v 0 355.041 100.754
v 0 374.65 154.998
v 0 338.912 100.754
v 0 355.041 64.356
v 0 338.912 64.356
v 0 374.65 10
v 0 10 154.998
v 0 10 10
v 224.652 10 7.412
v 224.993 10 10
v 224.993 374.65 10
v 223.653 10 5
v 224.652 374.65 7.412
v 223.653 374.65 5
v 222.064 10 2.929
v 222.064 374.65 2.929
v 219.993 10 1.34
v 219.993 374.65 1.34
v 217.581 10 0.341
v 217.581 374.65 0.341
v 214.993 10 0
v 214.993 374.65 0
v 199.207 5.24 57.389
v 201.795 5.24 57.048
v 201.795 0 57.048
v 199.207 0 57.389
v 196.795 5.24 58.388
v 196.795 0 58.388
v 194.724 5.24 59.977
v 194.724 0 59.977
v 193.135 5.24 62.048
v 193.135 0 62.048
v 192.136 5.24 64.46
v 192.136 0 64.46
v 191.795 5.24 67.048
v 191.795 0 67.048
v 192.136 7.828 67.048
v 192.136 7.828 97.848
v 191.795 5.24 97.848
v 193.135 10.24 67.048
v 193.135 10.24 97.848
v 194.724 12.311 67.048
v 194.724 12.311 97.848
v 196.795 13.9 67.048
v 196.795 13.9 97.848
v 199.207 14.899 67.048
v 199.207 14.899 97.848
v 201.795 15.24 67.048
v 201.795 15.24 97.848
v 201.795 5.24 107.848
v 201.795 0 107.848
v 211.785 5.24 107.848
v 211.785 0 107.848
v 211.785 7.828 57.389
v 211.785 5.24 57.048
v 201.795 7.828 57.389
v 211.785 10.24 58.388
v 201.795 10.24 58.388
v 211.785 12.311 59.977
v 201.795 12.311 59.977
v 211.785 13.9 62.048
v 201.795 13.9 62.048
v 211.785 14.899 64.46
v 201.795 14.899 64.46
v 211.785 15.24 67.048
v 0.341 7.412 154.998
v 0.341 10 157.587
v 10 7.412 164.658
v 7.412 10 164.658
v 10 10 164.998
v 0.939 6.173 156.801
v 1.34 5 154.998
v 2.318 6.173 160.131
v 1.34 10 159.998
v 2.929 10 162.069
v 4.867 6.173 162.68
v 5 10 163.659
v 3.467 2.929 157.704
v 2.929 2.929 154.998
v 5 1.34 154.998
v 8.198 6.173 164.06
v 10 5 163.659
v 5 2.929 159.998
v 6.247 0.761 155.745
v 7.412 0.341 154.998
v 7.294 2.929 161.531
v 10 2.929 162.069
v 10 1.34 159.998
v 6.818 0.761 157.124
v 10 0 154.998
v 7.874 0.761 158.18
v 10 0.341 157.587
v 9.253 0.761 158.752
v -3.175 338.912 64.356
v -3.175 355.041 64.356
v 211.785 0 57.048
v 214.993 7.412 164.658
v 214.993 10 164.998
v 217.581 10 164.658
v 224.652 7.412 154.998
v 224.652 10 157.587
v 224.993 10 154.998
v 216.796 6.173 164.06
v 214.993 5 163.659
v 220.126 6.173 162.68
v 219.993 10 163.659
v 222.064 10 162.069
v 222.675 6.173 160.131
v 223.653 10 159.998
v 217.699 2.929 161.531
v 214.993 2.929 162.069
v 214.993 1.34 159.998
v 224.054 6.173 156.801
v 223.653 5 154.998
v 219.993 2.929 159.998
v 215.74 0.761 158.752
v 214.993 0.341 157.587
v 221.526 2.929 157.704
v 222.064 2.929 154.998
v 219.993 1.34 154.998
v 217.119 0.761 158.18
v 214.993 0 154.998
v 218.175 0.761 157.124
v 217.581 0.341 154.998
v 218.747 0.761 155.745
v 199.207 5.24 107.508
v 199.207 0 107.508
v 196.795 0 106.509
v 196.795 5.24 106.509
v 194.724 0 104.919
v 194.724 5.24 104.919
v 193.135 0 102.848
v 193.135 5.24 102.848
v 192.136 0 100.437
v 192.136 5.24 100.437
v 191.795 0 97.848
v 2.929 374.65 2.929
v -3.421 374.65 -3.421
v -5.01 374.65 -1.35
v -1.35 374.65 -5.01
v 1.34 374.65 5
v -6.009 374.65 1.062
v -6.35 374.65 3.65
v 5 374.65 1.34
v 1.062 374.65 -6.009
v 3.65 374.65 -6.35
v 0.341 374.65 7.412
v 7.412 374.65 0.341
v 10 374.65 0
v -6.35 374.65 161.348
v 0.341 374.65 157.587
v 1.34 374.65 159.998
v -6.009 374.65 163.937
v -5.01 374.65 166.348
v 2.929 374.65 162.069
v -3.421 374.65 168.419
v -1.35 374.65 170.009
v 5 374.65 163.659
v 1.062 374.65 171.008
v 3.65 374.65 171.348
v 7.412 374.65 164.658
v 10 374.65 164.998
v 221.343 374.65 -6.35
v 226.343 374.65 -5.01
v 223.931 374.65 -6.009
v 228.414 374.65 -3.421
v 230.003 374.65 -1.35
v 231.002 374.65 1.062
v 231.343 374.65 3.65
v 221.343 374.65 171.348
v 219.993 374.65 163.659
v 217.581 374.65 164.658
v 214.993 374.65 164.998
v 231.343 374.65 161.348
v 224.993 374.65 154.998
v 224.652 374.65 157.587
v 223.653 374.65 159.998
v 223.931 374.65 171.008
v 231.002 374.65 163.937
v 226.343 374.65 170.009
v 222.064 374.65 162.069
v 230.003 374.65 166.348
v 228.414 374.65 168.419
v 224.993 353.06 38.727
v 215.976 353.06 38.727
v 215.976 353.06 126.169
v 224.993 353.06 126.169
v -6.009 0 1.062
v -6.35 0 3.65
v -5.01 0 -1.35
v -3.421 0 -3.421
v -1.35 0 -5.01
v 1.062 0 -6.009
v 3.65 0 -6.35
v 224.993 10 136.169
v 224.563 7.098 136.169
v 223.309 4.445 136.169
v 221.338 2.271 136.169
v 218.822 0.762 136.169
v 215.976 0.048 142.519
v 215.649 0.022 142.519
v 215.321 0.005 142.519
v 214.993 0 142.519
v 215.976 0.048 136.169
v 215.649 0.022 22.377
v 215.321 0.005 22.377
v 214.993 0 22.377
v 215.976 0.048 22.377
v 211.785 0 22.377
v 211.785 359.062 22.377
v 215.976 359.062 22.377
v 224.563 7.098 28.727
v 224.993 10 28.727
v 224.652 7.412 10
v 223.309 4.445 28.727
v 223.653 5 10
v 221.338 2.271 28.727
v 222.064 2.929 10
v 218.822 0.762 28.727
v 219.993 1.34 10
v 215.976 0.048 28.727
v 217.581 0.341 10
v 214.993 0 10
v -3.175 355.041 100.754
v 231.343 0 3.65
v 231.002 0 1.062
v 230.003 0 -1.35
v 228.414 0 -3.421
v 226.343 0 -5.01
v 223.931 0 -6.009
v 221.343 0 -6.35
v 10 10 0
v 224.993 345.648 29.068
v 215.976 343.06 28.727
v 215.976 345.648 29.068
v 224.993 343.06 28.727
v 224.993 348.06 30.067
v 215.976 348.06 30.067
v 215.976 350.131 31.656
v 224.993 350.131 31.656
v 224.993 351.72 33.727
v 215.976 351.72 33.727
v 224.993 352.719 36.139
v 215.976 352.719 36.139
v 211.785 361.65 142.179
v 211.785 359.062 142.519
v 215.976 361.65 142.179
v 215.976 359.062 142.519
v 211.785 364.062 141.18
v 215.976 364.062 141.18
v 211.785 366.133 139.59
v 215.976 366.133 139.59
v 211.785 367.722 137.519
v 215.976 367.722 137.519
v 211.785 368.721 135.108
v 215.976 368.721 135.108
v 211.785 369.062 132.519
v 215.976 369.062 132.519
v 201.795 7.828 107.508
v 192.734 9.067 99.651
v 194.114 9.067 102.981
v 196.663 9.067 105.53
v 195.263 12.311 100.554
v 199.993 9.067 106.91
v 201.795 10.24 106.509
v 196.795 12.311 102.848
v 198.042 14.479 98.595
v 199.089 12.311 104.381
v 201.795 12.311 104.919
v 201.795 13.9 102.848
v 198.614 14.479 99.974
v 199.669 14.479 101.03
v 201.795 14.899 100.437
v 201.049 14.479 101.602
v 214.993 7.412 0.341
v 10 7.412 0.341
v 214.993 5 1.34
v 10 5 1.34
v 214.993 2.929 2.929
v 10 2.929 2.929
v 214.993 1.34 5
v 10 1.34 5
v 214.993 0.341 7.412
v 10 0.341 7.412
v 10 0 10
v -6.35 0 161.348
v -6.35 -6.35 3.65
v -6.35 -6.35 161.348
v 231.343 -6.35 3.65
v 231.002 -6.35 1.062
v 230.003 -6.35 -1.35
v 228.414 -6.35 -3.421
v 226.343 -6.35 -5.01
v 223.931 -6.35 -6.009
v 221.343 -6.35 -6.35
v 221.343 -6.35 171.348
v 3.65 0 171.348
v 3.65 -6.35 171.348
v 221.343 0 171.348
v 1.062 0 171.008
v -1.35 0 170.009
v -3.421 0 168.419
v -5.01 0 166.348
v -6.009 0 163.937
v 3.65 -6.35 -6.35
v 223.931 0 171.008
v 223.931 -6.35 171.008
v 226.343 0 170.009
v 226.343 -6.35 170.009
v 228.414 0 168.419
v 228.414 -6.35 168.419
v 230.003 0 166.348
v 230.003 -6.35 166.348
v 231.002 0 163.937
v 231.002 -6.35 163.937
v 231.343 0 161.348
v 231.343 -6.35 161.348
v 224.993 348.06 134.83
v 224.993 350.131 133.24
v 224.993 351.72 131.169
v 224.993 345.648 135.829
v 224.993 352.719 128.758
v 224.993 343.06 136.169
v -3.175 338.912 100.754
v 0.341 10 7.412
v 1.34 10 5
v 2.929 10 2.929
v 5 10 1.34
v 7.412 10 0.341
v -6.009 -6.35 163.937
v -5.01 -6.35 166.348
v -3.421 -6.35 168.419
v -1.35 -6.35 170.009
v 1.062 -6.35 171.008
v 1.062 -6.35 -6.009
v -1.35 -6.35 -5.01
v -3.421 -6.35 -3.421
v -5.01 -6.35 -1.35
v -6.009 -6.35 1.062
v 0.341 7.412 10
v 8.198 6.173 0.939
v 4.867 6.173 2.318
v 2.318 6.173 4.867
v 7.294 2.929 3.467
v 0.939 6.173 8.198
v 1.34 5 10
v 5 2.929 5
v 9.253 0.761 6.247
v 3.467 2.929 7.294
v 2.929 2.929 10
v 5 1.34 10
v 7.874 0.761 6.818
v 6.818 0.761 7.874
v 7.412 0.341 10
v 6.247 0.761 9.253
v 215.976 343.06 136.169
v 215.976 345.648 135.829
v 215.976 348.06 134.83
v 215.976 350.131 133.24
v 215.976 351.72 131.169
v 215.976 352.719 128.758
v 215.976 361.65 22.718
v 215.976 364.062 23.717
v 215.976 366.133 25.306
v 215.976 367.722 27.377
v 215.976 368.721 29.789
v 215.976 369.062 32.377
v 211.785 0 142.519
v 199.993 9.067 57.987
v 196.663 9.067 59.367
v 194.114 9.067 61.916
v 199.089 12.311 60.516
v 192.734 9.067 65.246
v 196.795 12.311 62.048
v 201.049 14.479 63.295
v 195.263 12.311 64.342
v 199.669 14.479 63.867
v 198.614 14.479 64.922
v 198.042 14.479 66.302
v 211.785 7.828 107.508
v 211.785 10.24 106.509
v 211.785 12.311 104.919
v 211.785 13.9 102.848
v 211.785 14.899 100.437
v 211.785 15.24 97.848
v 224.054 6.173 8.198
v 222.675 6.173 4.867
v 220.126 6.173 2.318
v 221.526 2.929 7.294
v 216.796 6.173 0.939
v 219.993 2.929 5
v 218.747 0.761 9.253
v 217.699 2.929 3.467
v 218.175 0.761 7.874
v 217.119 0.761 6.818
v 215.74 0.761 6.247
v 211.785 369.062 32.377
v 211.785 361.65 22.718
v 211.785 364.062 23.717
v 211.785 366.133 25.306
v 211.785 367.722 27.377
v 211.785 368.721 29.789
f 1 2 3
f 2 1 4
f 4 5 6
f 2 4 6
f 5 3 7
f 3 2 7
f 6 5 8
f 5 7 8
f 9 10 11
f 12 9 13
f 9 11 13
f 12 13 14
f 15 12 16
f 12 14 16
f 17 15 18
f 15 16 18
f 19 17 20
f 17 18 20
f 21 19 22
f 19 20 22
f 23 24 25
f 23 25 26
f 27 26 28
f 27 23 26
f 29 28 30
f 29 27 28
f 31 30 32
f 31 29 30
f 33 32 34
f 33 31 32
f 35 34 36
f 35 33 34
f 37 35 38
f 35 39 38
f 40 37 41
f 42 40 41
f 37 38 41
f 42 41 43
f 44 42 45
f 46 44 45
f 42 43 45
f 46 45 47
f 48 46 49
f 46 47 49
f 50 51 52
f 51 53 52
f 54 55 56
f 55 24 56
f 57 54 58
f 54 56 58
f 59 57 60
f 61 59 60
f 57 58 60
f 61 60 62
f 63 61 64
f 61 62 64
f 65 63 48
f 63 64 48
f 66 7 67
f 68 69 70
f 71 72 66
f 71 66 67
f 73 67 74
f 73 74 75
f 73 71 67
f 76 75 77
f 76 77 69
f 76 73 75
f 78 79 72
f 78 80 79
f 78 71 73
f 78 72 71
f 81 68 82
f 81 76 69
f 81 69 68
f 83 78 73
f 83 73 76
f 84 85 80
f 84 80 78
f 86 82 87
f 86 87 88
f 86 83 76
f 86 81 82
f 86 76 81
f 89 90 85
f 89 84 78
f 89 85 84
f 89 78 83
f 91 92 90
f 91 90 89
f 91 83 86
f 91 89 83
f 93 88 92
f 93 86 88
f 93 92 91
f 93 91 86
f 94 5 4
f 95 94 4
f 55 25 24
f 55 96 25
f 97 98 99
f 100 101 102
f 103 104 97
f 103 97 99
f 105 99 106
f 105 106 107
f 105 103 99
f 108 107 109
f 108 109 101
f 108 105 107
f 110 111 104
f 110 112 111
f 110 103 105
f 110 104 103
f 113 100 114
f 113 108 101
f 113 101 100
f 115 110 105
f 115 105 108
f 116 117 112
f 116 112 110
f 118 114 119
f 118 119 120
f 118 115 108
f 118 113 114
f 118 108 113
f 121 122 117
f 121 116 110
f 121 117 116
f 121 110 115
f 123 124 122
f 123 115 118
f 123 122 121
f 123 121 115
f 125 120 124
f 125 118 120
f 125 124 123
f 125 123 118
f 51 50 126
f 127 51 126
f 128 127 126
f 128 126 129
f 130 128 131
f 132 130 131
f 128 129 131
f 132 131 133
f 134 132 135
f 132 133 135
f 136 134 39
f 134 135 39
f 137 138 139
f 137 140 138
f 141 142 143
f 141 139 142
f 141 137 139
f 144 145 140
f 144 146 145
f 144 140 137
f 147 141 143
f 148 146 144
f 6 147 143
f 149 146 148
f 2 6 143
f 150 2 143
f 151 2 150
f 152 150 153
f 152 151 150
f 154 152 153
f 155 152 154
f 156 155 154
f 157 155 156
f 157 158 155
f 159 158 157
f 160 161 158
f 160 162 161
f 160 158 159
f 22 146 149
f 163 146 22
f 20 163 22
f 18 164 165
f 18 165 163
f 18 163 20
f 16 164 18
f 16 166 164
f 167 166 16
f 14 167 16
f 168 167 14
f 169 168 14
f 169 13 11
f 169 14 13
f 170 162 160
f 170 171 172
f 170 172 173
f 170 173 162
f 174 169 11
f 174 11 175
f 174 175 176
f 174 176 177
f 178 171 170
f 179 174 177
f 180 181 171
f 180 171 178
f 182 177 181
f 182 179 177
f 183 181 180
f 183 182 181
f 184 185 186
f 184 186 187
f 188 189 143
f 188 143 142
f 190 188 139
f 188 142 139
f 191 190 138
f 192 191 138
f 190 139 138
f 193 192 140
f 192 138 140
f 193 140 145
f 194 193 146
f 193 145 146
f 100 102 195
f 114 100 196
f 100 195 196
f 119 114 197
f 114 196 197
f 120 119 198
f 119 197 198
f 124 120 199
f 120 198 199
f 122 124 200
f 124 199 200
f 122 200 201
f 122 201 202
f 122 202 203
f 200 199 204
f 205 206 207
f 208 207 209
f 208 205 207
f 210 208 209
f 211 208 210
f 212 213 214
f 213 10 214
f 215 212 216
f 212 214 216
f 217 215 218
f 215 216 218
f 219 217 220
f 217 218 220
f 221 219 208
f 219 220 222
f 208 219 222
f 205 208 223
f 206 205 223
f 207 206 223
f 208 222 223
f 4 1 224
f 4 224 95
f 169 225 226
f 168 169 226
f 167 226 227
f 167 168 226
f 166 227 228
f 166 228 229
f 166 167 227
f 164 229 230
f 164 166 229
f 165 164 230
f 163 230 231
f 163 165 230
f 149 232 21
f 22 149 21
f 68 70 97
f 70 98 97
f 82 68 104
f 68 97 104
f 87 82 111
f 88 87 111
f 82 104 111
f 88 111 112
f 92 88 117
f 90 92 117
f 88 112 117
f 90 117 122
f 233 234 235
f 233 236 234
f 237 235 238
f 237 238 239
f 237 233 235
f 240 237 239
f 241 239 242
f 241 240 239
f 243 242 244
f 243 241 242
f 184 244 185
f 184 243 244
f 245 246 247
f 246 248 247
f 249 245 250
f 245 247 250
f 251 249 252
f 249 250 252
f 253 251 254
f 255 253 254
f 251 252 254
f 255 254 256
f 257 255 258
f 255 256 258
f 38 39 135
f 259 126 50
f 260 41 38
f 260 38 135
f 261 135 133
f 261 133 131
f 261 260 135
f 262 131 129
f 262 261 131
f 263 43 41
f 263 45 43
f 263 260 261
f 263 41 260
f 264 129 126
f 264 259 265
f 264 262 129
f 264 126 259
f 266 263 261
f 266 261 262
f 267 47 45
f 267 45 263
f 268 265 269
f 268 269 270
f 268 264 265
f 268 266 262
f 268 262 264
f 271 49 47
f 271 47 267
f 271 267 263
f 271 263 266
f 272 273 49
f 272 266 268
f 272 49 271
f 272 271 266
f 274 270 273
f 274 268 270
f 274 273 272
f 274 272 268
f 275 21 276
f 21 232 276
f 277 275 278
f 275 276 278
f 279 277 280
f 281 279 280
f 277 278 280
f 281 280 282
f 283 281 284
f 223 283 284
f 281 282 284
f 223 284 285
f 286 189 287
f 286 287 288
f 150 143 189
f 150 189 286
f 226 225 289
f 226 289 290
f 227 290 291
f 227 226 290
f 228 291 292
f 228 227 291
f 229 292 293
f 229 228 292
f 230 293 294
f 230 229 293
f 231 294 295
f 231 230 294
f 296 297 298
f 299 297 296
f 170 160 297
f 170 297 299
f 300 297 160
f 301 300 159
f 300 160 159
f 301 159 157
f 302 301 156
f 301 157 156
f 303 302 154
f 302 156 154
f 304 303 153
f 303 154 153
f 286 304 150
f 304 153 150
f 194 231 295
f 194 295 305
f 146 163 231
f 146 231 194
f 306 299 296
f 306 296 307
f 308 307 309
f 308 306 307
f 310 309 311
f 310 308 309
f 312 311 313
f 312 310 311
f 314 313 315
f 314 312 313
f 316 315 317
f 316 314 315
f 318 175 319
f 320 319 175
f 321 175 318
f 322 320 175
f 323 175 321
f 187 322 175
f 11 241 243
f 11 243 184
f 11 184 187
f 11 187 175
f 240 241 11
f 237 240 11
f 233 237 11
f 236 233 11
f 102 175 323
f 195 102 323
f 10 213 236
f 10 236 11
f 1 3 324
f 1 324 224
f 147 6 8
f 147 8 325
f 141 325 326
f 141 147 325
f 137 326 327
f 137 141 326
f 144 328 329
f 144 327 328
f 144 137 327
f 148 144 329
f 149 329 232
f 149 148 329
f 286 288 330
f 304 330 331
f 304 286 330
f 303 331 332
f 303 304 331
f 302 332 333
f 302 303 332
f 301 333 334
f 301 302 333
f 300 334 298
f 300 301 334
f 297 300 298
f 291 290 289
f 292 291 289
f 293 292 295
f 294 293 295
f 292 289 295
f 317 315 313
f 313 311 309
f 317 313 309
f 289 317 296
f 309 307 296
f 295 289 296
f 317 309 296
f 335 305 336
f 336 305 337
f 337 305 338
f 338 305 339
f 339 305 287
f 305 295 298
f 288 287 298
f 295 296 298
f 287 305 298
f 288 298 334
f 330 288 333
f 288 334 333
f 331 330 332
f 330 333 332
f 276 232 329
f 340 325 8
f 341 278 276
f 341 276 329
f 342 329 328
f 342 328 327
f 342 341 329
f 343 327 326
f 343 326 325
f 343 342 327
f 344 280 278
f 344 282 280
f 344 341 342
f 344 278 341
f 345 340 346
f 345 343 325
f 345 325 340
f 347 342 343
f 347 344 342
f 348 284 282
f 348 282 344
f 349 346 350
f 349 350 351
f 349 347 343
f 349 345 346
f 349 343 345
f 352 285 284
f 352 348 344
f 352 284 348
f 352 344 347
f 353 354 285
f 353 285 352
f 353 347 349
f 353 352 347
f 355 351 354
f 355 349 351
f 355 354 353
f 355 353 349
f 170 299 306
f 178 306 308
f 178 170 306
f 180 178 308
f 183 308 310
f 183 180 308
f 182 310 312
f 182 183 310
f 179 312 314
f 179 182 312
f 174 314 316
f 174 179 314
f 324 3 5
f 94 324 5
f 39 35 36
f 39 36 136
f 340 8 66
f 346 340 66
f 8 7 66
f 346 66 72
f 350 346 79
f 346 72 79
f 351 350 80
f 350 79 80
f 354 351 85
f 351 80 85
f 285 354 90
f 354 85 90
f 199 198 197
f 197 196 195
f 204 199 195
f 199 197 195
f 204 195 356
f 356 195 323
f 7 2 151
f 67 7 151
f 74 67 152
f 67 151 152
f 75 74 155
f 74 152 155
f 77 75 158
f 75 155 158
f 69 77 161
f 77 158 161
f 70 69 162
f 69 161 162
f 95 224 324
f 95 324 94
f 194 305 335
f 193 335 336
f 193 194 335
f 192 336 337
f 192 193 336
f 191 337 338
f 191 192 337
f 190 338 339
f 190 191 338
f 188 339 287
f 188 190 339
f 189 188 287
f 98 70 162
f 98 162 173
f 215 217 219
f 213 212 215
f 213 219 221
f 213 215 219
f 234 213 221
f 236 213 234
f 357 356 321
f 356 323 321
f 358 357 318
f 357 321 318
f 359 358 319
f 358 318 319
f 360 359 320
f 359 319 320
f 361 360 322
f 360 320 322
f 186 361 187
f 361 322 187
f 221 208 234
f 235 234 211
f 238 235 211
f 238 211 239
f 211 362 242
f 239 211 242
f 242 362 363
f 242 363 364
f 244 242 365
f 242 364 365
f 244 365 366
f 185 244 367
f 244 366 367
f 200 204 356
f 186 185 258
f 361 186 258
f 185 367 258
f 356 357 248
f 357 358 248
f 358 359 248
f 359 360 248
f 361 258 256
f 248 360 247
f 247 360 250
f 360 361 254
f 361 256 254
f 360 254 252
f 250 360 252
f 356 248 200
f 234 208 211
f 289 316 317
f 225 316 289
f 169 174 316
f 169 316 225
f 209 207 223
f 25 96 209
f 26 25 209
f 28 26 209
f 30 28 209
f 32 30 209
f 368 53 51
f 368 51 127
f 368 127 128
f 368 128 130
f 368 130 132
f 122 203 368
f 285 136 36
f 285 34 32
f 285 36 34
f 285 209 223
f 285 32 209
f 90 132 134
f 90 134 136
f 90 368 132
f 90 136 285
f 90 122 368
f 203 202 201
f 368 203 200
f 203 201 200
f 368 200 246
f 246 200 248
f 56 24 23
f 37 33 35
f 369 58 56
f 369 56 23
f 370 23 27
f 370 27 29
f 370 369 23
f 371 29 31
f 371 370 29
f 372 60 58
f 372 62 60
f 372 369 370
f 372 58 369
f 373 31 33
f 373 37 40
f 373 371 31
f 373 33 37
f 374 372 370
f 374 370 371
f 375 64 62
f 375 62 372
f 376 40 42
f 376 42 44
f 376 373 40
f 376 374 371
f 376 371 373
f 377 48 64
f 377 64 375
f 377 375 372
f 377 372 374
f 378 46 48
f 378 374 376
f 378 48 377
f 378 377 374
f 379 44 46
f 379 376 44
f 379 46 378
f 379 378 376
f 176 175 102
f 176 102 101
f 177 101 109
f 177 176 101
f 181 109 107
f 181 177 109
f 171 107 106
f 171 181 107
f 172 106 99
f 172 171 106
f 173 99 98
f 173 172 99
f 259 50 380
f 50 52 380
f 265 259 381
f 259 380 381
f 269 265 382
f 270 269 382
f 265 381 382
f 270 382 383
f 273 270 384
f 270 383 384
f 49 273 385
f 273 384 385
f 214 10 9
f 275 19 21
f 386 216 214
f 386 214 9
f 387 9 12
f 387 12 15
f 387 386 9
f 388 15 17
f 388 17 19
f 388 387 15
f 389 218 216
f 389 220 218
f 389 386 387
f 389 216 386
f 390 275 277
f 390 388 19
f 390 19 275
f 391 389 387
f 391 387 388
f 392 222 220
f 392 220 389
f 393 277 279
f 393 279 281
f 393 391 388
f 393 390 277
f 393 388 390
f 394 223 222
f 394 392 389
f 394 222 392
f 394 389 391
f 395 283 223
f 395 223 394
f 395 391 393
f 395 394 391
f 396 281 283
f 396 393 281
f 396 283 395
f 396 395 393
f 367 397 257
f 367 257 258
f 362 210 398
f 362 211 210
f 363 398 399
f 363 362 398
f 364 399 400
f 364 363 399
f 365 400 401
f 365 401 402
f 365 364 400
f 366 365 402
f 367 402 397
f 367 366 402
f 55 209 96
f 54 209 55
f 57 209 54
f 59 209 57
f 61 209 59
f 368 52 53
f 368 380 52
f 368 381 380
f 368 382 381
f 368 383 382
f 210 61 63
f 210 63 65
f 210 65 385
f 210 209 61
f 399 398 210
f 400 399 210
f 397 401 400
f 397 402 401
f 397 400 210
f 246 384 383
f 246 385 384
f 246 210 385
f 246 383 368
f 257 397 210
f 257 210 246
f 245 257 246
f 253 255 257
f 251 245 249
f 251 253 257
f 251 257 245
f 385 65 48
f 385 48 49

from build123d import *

# Parameters (mm, degrees)
SKETCH1_W           = 237.6932
SKETCH1_H           = 177.6984
SKETCH1_W_2         = 224.9932
SKETCH1_H_2         = 164.9984
BOSS_EXTRUDE1_DEPTH = 374.65
SKETCH4_W           = 107.442
SKETCH4_H           = 374.65
BOSS_EXTRUDE2_DEPTH = 9.017
SKETCH5_W           = 120.142
SKETCH5_H           = 374.65
BOSS_EXTRUDE3_DEPTH = 4.191
SKETCH7_W           = 9.017
SKETCH7_H           = 107.442
CUT_EXTRUDE1_DEPTH  = 21.59
SKETCH10_W          = 4.191
SKETCH10_H          = 120.142
CUT_EXTRUDE2_DEPTH  = 5.588
FILLET1_R           = 10
FILLET2_R           = 10
FILLET3_R           = 10
FILLET4_R           = 10
FILLET5_R           = 10
FILLET6_R           = 10
FILLET7_R           = 10
SKETCH11_W          = 50.8
SKETCH11_H          = 15.24
BOSS_EXTRUDE4_DEPTH = 19.9898
FILLET10_R          = 10
FILLET11_R          = 10
BOSS_EXTRUDE5_DEPTH = 6.35
FILLET13_R          = 10
SKETCH13_W          = 36.3982
SKETCH13_H          = 16.129
CUT_EXTRUDE4_DEPTH  = 3.175


with BuildPart() as part:
    # Sketch1 → Boss-Extrude1 (new body)
    with BuildSketch(Plane(origin=(0, 0, 0), x_dir=(1, 0, 0), z_dir=(0, 1, 0))):
        with Locations((112.4966, -82.4992)):
            Rectangle(SKETCH1_W, SKETCH1_H)
        with Locations((112.4966, -82.4992)):
            Rectangle(SKETCH1_W_2, SKETCH1_H_2, mode=Mode.SUBTRACT)
    extrude(amount=BOSS_EXTRUDE1_DEPTH)

    # Sketch4 → Boss-Extrude2 (add)
    with BuildSketch(Plane.ZY.offset(-224.9932)):
        with Locations((82.4484, 187.325)):
            Rectangle(SKETCH4_W, SKETCH4_H)
    extrude(amount=BOSS_EXTRUDE2_DEPTH)

    # Sketch5 → Boss-Extrude3 (add)
    with BuildSketch(Plane.ZY.offset(-215.9762)):
        with Locations((82.4484, 187.325)):
            Rectangle(SKETCH5_W, SKETCH5_H)
    extrude(amount=BOSS_EXTRUDE3_DEPTH)

    # Sketch7 → Cut-Extrude1 (cut)
    with BuildSketch(Plane(origin=(0, 374.65, 0), x_dir=(1, 0, 0), z_dir=(0, 1, 0))):
        with Locations((220.4847, -82.4484)):
            Rectangle(SKETCH7_W, SKETCH7_H)
    extrude(amount=-CUT_EXTRUDE1_DEPTH, mode=Mode.SUBTRACT)

    # Sketch10 → Cut-Extrude2 (cut)
    with BuildSketch(Plane(origin=(0, 374.65, 0), x_dir=(1, 0, 0), z_dir=(0, 1, 0))):
        with Locations((213.8807, -82.4484)):
            Rectangle(SKETCH10_W, SKETCH10_H)
    extrude(amount=-CUT_EXTRUDE2_DEPTH, mode=Mode.SUBTRACT)

    # Fillet1
    fillet1_edges = [part.edges().sort_by_distance(p)[0] for p in [
        (231.3432, 187.325, 171.3484),
    ]]
    fillet(fillet1_edges, radius=FILLET1_R)

    # Fillet2
    fillet2_edges = [part.edges().sort_by_distance(p)[0] for p in [
        (224.9932, 187.325, 164.9984),
    ]]
    fillet(fillet2_edges, radius=FILLET2_R)

    # Fillet3
    fillet3_edges = [part.edges().sort_by_distance(p)[0] for p in [
        (224.9932, 187.325, 0),
        (231.3432, 187.325, -6.35),
    ]]
    fillet(fillet3_edges, radius=FILLET3_R)

    # Fillet4
    fillet4_edges = [part.edges().sort_by_distance(p)[0] for p in [
        (0, 187.325, 164.9984),
        (-6.35, 187.325, 171.3484),
    ]]
    fillet(fillet4_edges, radius=FILLET4_R)

    # Fillet5
    fillet5_edges = [part.edges().sort_by_distance(p)[0] for p in [
        (0, 187.325, 0),
        (-6.35, 187.325, -6.35),
    ]]
    fillet(fillet5_edges, radius=FILLET5_R)

    # Fillet6
    fillet6_edges = [part.edges().sort_by_distance(p)[0] for p in [
        (220.4847, 353.06, 28.7274),
        (220.4847, 353.06, 136.1694),
    ]]
    fillet(fillet6_edges, radius=FILLET6_R)

    # Fillet7
    fillet7_edges = [part.edges().sort_by_distance(p)[0] for p in [
        (213.8807, 369.062, 22.3774),
        (213.8807, 369.062, 142.5194),
    ]]
    fillet(fillet7_edges, radius=FILLET7_R)

    # Sketch11 → Boss-Extrude4 (add)
    with BuildSketch(Plane.ZY.offset(-211.7852)):
        with Locations((82.4484, 7.62)):
            Rectangle(SKETCH11_W, SKETCH11_H)
    extrude(amount=BOSS_EXTRUDE4_DEPTH)

    # Fillet10
    fillet10_edges = [part.edges().sort_by_distance(p)[0] for p in [
        (191.7954, 7.62, 57.0484),
        (191.7954, 7.62, 107.8484),
    ]]
    fillet(fillet10_edges, radius=FILLET10_R)

    # Fillet11
    fillet11_edges = [part.edges().sort_by_distance(p)[0] for p in [
        (191.7954, 15.24, 82.4484),
        (206.7903, 15.24, 57.0484),
        (206.7903, 15.24, 107.8484),
        (194.724332188, 15.24, 59.977332188),
        (194.724332188, 15.24, 104.919467812),
    ]]
    fillet(fillet11_edges, radius=FILLET11_R)

    # Sketch12 → Boss-Extrude5 (add)
    with BuildSketch(Plane.XZ):
        with BuildLine():
            Line((231.3432, 161.3484), (231.3432, 3.65))
            ThreePointArc((231.3432, 3.65), (228.414267812, -3.421067812), (221.3432, -6.35))
            Line((221.3432, -6.35), (3.65, -6.35))
            ThreePointArc((3.65, -6.35), (-3.421067812, -3.421067812), (-6.35, 3.65))
            Line((-6.35, 3.65), (-6.35, 161.3484))
            ThreePointArc((-6.35, 161.3484), (-3.421067812, 168.419467812), (3.65, 171.3484))
            Line((3.65, 171.3484), (221.3432, 171.3484))
            ThreePointArc((221.3432, 171.3484), (228.414267812, 168.419467812), (231.3432, 161.3484))
        make_face()
    extrude(amount=BOSS_EXTRUDE5_DEPTH)

    # Fillet13
    fillet13_edges = [part.edges().sort_by_distance(p)[0] for p in [
        (224.9932, 0, 19.3637),
        (222.064267812, 0, 2.928932188),
        (112.4966, 0, 0),
        (2.928932188, 0, 2.928932188),
        (224.9932, 0, 145.5839),
        (222.064267812, 0, 162.069467812),
        (112.4966, 0, 164.9984),
        (2.928932188, 0, 162.069467812),
        (0, 0, 82.4992),
    ]]
    fillet(fillet13_edges, radius=FILLET13_R)

    # Sketch13 → Cut-Extrude4 (cut)
    with BuildSketch(Plane(origin=(0, 0, 0), x_dir=(0, 0, -1), z_dir=(1, 0, 0))):
        with Locations((-82.5551, 346.9767)):
            Rectangle(SKETCH13_W, SKETCH13_H)
    extrude(amount=-CUT_EXTRUDE4_DEPTH, mode=Mode.SUBTRACT)


solid = part.part
